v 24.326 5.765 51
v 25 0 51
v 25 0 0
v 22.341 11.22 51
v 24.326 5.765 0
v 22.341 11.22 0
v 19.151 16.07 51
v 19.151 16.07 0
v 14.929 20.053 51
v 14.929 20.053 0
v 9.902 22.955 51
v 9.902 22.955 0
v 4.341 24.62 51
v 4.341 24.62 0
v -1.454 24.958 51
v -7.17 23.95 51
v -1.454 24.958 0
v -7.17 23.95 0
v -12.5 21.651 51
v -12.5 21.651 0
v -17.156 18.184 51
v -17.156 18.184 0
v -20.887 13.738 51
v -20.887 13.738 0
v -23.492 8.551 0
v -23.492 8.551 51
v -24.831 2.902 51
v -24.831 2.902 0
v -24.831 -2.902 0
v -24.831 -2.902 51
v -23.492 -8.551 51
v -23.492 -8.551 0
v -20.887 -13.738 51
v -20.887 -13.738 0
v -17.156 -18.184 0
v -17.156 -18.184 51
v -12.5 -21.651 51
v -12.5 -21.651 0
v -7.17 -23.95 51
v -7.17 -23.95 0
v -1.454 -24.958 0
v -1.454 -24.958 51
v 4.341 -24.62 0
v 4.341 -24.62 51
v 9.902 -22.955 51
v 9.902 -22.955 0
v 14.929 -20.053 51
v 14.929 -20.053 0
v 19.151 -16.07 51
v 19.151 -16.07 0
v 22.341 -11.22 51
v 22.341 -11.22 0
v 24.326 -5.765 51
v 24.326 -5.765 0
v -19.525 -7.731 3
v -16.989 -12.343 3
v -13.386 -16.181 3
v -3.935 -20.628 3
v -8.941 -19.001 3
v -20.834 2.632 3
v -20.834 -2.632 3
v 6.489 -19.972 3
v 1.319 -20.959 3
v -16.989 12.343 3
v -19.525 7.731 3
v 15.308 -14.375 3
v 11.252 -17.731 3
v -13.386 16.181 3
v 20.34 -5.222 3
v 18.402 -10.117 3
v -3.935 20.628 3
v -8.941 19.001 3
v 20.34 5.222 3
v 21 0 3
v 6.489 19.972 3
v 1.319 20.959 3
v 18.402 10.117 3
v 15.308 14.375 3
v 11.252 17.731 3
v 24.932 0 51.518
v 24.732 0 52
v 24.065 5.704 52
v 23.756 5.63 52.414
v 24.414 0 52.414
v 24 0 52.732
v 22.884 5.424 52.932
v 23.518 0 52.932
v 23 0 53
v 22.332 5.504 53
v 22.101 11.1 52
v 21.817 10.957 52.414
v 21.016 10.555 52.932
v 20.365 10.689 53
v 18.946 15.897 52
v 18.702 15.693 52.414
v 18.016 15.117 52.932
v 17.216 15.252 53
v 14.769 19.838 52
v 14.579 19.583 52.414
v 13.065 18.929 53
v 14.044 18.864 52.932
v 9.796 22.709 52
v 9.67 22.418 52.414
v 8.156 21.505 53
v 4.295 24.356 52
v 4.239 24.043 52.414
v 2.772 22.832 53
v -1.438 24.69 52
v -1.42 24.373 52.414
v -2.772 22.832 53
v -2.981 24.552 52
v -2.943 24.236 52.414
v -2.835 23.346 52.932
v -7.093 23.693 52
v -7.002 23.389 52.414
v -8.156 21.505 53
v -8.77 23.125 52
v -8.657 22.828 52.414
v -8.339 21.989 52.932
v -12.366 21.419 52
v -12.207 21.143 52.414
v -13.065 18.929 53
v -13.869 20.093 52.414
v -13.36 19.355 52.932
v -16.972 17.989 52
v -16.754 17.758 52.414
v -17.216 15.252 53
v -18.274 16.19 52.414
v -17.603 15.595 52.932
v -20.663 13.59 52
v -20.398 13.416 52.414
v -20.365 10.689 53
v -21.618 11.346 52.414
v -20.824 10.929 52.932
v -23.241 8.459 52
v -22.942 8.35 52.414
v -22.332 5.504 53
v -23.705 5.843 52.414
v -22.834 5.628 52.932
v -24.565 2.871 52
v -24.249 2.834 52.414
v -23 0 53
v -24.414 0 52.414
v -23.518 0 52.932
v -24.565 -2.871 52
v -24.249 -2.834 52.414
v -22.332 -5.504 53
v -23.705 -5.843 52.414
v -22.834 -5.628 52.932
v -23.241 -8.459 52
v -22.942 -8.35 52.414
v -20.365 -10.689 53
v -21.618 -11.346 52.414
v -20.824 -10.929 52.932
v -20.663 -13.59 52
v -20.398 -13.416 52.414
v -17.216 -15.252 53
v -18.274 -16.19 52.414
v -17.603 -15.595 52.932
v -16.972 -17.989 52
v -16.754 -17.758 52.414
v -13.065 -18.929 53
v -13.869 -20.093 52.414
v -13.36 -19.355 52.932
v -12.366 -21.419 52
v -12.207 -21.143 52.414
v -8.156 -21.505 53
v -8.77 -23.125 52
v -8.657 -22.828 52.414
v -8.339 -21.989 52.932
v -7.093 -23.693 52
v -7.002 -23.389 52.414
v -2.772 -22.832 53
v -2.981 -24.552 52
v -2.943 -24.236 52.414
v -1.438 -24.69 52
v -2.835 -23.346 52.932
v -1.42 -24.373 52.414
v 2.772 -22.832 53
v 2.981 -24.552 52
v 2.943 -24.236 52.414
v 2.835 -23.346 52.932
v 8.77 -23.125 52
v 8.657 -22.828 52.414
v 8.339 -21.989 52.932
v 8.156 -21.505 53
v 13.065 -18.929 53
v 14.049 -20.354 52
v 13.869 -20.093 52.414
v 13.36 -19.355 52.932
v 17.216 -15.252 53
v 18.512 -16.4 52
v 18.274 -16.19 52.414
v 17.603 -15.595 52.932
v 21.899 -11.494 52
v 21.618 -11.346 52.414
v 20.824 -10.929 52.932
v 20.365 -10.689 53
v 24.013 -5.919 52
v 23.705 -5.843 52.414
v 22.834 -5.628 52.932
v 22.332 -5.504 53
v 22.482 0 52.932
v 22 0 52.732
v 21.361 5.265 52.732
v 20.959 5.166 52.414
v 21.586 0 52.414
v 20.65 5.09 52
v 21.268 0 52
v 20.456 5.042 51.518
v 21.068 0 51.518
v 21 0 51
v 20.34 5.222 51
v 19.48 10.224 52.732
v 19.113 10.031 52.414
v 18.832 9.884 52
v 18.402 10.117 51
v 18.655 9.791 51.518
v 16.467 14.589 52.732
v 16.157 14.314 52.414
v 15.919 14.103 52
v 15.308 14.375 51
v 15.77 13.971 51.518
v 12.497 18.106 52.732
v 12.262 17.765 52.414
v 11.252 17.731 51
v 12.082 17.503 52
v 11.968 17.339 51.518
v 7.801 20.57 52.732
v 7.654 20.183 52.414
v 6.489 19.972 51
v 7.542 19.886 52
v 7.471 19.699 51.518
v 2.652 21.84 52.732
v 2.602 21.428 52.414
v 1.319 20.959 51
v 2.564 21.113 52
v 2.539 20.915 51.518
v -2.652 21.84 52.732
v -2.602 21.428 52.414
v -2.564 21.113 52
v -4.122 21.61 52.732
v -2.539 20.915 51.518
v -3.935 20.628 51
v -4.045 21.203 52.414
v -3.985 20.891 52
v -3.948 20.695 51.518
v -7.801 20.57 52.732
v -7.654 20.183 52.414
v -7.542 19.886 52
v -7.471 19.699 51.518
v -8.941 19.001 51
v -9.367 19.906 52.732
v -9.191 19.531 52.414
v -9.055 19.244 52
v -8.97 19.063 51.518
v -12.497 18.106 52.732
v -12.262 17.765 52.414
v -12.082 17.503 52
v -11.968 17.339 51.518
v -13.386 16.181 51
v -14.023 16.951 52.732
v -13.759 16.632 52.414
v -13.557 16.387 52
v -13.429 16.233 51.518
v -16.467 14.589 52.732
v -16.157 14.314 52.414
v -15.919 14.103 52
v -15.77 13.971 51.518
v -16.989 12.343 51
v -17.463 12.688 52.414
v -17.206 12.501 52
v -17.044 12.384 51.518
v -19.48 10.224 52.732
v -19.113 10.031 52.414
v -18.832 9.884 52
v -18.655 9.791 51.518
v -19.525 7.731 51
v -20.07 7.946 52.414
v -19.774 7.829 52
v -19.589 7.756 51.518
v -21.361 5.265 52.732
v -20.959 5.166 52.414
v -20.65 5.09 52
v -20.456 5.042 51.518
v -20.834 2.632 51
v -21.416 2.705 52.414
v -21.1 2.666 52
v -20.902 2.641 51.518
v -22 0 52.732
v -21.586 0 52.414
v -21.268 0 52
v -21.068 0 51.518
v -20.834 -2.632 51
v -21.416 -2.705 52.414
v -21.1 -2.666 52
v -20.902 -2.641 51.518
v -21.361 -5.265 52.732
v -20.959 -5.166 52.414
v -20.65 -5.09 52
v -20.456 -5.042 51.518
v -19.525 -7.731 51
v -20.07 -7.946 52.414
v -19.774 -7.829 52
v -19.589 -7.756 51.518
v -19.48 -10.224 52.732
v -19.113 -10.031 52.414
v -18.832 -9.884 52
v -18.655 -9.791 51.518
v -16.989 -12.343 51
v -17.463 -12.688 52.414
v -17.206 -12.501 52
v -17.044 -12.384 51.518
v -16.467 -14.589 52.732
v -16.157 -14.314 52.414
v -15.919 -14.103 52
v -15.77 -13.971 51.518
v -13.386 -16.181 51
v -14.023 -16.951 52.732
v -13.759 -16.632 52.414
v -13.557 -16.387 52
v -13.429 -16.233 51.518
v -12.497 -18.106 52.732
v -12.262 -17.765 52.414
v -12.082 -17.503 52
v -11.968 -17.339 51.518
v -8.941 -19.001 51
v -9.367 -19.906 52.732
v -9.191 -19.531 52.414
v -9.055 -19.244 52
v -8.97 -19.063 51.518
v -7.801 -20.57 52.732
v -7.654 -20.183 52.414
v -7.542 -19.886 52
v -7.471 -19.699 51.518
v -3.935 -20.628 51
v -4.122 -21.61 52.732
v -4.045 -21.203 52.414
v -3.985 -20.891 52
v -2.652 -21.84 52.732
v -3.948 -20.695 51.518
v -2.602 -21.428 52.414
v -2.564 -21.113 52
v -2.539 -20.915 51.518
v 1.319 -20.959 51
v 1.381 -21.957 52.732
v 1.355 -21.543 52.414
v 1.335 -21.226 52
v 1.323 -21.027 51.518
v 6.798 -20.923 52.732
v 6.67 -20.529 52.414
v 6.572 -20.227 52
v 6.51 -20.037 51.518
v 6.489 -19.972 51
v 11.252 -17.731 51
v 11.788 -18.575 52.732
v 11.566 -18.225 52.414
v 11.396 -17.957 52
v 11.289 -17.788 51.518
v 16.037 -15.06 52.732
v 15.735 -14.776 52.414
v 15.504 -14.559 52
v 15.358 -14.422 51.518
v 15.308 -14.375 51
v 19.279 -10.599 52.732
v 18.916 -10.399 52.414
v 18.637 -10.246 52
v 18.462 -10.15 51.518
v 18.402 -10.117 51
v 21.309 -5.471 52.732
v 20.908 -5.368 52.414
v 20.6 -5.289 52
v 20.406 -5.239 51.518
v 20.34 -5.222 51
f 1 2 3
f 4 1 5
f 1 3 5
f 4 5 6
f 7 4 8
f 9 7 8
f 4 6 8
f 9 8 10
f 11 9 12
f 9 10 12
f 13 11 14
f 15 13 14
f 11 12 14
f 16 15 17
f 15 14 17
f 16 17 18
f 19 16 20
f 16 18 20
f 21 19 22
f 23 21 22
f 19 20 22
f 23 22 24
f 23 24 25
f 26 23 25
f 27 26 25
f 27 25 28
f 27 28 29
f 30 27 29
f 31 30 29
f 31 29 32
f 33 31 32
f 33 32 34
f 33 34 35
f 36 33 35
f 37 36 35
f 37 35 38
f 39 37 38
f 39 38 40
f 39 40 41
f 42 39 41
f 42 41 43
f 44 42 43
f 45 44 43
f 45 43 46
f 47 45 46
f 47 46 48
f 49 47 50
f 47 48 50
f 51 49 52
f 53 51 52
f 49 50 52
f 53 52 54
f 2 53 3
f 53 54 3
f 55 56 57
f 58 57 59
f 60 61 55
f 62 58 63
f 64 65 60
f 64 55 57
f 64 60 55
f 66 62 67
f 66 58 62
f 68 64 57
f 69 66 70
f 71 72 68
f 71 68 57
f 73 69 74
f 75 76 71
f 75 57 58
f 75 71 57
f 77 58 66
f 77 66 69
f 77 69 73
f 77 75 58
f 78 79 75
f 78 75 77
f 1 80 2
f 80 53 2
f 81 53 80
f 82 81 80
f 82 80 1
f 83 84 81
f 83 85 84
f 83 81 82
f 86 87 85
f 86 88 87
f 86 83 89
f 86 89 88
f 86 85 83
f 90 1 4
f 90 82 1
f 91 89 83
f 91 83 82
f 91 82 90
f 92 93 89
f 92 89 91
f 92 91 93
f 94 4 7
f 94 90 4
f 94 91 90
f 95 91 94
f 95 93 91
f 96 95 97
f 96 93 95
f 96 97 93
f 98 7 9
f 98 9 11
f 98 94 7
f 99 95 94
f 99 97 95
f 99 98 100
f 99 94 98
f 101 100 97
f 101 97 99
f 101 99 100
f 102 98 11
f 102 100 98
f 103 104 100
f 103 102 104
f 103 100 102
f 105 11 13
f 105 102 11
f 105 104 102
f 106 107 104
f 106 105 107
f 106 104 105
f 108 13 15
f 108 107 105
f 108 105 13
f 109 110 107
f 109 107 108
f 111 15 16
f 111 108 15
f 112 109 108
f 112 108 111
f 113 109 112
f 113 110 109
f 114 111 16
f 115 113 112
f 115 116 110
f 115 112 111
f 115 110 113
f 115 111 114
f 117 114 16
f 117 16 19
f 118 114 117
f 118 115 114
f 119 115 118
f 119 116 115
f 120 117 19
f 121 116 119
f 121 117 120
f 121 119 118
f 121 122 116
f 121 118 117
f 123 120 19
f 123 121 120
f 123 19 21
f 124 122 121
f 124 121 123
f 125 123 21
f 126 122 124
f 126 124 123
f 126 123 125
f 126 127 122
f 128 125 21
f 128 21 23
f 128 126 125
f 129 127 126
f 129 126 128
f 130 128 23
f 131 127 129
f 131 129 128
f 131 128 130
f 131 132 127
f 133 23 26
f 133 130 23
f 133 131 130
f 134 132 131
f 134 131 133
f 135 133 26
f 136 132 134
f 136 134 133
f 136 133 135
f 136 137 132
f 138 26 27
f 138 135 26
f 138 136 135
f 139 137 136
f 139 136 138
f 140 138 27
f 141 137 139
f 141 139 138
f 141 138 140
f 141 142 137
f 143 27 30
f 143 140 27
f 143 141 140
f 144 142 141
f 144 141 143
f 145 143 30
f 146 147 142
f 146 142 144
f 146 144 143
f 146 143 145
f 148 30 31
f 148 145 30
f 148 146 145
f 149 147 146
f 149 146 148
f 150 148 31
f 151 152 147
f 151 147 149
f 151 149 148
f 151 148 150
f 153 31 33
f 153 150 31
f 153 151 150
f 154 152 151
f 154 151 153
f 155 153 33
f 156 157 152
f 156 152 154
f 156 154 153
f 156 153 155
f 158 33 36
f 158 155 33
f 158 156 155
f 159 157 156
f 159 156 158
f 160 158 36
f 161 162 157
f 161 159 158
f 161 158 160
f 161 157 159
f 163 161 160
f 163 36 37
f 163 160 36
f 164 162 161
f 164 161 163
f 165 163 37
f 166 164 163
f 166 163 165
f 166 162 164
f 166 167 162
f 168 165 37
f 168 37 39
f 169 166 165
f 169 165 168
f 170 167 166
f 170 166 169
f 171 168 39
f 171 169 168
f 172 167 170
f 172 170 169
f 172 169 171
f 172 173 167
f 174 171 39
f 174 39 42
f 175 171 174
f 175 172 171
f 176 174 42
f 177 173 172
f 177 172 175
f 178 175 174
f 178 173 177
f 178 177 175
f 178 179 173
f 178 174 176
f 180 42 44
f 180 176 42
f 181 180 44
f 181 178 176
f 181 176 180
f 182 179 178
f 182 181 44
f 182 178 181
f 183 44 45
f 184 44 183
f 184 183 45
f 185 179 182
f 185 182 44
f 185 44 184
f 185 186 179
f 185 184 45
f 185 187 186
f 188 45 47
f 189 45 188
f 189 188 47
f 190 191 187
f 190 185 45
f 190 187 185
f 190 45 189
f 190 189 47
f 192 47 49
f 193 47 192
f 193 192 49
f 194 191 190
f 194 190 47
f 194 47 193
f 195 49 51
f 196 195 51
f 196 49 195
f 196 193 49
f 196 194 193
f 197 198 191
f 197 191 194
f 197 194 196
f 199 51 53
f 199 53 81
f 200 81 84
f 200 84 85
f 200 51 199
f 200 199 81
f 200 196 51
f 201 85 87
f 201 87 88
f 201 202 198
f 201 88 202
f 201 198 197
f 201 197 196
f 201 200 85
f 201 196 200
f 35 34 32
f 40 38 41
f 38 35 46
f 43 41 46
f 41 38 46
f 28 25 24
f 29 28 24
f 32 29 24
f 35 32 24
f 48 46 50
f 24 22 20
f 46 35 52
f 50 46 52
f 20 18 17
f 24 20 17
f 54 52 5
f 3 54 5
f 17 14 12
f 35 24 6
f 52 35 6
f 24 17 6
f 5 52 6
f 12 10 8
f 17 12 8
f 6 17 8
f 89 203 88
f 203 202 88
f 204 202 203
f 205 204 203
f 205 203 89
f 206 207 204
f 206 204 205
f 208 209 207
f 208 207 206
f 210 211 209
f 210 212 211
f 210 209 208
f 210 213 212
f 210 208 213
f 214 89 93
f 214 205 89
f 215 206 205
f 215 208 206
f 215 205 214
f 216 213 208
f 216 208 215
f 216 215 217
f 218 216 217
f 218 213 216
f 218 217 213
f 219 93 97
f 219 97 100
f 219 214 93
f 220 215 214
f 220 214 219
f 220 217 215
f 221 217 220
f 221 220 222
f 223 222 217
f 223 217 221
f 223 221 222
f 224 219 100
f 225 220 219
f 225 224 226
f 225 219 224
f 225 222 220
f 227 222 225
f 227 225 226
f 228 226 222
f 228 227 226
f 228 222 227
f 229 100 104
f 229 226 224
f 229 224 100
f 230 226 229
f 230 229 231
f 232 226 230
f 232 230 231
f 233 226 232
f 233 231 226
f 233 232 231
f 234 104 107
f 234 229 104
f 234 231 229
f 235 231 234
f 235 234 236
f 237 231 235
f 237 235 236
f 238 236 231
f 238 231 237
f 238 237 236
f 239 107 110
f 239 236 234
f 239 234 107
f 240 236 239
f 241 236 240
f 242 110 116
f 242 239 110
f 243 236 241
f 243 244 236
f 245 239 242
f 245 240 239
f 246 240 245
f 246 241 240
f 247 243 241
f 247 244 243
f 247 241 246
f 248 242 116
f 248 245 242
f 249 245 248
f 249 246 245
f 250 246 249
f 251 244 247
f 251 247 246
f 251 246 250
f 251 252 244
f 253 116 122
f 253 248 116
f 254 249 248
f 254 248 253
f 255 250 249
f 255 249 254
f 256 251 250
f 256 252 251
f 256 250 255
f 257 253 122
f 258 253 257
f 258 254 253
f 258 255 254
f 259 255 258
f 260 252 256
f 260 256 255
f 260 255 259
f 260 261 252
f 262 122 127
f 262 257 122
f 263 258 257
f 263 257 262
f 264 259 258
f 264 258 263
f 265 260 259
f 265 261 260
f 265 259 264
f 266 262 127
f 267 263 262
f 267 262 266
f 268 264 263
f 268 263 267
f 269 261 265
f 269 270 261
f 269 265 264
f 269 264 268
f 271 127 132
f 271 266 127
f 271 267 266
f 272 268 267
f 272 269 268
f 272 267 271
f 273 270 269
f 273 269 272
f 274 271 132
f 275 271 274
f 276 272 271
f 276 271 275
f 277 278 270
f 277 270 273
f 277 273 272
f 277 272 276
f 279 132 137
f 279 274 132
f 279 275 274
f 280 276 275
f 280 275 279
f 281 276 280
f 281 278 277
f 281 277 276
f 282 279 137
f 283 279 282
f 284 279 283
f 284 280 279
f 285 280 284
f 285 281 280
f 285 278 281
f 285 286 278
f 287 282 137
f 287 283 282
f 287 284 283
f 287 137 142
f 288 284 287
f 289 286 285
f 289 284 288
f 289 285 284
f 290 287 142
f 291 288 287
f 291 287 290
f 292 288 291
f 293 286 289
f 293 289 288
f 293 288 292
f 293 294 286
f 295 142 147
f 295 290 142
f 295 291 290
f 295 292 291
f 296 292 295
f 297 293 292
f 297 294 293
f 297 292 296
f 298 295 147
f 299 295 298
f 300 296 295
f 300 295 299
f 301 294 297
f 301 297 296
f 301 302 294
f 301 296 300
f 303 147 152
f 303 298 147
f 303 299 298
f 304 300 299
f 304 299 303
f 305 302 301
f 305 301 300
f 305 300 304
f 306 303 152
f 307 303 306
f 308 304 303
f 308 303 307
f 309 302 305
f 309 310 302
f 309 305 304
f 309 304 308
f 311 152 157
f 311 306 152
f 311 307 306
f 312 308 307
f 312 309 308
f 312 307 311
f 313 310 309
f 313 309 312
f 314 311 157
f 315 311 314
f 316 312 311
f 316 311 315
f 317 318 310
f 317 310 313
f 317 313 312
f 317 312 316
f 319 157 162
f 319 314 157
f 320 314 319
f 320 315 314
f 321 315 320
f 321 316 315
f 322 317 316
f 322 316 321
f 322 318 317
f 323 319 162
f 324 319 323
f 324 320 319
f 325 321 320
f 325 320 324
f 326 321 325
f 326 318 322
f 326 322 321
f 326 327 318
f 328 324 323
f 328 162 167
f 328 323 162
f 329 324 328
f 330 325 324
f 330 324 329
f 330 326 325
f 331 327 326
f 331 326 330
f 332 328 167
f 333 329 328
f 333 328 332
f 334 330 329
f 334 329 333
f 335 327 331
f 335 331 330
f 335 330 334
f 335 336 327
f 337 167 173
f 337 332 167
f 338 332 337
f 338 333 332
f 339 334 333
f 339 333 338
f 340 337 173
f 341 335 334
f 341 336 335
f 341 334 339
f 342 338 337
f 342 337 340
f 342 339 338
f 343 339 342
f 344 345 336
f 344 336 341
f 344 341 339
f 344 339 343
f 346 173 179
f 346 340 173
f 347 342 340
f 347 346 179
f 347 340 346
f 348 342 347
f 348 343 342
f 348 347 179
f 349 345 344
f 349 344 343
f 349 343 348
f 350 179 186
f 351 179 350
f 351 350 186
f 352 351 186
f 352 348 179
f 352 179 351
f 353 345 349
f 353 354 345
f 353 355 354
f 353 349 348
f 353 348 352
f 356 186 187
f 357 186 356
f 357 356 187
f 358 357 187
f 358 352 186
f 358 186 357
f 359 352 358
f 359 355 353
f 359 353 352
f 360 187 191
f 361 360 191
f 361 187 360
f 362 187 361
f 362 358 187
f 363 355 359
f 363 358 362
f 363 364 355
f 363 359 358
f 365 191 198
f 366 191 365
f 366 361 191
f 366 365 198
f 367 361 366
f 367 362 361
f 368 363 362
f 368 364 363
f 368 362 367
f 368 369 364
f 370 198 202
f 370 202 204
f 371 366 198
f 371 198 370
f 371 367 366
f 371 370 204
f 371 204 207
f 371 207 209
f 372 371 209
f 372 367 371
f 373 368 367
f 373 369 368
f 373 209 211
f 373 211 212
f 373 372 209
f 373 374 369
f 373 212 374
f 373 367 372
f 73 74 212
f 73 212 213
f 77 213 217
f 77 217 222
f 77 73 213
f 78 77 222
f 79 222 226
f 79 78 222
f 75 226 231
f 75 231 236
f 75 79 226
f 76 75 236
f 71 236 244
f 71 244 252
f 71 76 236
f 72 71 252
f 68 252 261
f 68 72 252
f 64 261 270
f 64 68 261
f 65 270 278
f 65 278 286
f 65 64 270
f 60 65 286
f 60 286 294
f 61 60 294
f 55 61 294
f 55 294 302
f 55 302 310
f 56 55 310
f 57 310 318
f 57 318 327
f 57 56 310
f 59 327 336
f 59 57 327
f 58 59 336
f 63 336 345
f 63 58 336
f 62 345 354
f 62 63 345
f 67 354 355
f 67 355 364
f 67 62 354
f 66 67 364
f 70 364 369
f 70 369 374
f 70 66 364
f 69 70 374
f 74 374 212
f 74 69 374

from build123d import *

# Parameters (mm, degrees)
F0_R     = 25
F1_DEPTH = 3
F2_R     = 25
F2_R_2   = 21
F3_DEPTH = 50
F4_R     = 1.99999


# Not quite as in the source:
# - a fillet or chamfer is up to 0.001 mm smaller than in the source, because OpenCascade refuses the exact size


with BuildPart() as f1:
    # F0 (on Top) → F1 (new body)
    with BuildSketch(Plane.XY):
        Circle(F0_R)
    extrude(amount=F1_DEPTH)

    # F2 (on face) → F3 (join)
    with BuildSketch(Plane.XY.offset(3)):
        Circle(F2_R)
        Circle(F2_R_2, mode=Mode.SUBTRACT)
    extrude(amount=F3_DEPTH)

    # F4 (radius 2 in the source; OpenCascade refuses exactly that, so slightly less here)
    f4_edges = [f1.edges().sort_by_distance(p)[0] for p in [
        (-25, 0, 53),
        (-21, 0, 53),
    ]]
    fillet(f4_edges, radius=F4_R)


solid = f1.part
